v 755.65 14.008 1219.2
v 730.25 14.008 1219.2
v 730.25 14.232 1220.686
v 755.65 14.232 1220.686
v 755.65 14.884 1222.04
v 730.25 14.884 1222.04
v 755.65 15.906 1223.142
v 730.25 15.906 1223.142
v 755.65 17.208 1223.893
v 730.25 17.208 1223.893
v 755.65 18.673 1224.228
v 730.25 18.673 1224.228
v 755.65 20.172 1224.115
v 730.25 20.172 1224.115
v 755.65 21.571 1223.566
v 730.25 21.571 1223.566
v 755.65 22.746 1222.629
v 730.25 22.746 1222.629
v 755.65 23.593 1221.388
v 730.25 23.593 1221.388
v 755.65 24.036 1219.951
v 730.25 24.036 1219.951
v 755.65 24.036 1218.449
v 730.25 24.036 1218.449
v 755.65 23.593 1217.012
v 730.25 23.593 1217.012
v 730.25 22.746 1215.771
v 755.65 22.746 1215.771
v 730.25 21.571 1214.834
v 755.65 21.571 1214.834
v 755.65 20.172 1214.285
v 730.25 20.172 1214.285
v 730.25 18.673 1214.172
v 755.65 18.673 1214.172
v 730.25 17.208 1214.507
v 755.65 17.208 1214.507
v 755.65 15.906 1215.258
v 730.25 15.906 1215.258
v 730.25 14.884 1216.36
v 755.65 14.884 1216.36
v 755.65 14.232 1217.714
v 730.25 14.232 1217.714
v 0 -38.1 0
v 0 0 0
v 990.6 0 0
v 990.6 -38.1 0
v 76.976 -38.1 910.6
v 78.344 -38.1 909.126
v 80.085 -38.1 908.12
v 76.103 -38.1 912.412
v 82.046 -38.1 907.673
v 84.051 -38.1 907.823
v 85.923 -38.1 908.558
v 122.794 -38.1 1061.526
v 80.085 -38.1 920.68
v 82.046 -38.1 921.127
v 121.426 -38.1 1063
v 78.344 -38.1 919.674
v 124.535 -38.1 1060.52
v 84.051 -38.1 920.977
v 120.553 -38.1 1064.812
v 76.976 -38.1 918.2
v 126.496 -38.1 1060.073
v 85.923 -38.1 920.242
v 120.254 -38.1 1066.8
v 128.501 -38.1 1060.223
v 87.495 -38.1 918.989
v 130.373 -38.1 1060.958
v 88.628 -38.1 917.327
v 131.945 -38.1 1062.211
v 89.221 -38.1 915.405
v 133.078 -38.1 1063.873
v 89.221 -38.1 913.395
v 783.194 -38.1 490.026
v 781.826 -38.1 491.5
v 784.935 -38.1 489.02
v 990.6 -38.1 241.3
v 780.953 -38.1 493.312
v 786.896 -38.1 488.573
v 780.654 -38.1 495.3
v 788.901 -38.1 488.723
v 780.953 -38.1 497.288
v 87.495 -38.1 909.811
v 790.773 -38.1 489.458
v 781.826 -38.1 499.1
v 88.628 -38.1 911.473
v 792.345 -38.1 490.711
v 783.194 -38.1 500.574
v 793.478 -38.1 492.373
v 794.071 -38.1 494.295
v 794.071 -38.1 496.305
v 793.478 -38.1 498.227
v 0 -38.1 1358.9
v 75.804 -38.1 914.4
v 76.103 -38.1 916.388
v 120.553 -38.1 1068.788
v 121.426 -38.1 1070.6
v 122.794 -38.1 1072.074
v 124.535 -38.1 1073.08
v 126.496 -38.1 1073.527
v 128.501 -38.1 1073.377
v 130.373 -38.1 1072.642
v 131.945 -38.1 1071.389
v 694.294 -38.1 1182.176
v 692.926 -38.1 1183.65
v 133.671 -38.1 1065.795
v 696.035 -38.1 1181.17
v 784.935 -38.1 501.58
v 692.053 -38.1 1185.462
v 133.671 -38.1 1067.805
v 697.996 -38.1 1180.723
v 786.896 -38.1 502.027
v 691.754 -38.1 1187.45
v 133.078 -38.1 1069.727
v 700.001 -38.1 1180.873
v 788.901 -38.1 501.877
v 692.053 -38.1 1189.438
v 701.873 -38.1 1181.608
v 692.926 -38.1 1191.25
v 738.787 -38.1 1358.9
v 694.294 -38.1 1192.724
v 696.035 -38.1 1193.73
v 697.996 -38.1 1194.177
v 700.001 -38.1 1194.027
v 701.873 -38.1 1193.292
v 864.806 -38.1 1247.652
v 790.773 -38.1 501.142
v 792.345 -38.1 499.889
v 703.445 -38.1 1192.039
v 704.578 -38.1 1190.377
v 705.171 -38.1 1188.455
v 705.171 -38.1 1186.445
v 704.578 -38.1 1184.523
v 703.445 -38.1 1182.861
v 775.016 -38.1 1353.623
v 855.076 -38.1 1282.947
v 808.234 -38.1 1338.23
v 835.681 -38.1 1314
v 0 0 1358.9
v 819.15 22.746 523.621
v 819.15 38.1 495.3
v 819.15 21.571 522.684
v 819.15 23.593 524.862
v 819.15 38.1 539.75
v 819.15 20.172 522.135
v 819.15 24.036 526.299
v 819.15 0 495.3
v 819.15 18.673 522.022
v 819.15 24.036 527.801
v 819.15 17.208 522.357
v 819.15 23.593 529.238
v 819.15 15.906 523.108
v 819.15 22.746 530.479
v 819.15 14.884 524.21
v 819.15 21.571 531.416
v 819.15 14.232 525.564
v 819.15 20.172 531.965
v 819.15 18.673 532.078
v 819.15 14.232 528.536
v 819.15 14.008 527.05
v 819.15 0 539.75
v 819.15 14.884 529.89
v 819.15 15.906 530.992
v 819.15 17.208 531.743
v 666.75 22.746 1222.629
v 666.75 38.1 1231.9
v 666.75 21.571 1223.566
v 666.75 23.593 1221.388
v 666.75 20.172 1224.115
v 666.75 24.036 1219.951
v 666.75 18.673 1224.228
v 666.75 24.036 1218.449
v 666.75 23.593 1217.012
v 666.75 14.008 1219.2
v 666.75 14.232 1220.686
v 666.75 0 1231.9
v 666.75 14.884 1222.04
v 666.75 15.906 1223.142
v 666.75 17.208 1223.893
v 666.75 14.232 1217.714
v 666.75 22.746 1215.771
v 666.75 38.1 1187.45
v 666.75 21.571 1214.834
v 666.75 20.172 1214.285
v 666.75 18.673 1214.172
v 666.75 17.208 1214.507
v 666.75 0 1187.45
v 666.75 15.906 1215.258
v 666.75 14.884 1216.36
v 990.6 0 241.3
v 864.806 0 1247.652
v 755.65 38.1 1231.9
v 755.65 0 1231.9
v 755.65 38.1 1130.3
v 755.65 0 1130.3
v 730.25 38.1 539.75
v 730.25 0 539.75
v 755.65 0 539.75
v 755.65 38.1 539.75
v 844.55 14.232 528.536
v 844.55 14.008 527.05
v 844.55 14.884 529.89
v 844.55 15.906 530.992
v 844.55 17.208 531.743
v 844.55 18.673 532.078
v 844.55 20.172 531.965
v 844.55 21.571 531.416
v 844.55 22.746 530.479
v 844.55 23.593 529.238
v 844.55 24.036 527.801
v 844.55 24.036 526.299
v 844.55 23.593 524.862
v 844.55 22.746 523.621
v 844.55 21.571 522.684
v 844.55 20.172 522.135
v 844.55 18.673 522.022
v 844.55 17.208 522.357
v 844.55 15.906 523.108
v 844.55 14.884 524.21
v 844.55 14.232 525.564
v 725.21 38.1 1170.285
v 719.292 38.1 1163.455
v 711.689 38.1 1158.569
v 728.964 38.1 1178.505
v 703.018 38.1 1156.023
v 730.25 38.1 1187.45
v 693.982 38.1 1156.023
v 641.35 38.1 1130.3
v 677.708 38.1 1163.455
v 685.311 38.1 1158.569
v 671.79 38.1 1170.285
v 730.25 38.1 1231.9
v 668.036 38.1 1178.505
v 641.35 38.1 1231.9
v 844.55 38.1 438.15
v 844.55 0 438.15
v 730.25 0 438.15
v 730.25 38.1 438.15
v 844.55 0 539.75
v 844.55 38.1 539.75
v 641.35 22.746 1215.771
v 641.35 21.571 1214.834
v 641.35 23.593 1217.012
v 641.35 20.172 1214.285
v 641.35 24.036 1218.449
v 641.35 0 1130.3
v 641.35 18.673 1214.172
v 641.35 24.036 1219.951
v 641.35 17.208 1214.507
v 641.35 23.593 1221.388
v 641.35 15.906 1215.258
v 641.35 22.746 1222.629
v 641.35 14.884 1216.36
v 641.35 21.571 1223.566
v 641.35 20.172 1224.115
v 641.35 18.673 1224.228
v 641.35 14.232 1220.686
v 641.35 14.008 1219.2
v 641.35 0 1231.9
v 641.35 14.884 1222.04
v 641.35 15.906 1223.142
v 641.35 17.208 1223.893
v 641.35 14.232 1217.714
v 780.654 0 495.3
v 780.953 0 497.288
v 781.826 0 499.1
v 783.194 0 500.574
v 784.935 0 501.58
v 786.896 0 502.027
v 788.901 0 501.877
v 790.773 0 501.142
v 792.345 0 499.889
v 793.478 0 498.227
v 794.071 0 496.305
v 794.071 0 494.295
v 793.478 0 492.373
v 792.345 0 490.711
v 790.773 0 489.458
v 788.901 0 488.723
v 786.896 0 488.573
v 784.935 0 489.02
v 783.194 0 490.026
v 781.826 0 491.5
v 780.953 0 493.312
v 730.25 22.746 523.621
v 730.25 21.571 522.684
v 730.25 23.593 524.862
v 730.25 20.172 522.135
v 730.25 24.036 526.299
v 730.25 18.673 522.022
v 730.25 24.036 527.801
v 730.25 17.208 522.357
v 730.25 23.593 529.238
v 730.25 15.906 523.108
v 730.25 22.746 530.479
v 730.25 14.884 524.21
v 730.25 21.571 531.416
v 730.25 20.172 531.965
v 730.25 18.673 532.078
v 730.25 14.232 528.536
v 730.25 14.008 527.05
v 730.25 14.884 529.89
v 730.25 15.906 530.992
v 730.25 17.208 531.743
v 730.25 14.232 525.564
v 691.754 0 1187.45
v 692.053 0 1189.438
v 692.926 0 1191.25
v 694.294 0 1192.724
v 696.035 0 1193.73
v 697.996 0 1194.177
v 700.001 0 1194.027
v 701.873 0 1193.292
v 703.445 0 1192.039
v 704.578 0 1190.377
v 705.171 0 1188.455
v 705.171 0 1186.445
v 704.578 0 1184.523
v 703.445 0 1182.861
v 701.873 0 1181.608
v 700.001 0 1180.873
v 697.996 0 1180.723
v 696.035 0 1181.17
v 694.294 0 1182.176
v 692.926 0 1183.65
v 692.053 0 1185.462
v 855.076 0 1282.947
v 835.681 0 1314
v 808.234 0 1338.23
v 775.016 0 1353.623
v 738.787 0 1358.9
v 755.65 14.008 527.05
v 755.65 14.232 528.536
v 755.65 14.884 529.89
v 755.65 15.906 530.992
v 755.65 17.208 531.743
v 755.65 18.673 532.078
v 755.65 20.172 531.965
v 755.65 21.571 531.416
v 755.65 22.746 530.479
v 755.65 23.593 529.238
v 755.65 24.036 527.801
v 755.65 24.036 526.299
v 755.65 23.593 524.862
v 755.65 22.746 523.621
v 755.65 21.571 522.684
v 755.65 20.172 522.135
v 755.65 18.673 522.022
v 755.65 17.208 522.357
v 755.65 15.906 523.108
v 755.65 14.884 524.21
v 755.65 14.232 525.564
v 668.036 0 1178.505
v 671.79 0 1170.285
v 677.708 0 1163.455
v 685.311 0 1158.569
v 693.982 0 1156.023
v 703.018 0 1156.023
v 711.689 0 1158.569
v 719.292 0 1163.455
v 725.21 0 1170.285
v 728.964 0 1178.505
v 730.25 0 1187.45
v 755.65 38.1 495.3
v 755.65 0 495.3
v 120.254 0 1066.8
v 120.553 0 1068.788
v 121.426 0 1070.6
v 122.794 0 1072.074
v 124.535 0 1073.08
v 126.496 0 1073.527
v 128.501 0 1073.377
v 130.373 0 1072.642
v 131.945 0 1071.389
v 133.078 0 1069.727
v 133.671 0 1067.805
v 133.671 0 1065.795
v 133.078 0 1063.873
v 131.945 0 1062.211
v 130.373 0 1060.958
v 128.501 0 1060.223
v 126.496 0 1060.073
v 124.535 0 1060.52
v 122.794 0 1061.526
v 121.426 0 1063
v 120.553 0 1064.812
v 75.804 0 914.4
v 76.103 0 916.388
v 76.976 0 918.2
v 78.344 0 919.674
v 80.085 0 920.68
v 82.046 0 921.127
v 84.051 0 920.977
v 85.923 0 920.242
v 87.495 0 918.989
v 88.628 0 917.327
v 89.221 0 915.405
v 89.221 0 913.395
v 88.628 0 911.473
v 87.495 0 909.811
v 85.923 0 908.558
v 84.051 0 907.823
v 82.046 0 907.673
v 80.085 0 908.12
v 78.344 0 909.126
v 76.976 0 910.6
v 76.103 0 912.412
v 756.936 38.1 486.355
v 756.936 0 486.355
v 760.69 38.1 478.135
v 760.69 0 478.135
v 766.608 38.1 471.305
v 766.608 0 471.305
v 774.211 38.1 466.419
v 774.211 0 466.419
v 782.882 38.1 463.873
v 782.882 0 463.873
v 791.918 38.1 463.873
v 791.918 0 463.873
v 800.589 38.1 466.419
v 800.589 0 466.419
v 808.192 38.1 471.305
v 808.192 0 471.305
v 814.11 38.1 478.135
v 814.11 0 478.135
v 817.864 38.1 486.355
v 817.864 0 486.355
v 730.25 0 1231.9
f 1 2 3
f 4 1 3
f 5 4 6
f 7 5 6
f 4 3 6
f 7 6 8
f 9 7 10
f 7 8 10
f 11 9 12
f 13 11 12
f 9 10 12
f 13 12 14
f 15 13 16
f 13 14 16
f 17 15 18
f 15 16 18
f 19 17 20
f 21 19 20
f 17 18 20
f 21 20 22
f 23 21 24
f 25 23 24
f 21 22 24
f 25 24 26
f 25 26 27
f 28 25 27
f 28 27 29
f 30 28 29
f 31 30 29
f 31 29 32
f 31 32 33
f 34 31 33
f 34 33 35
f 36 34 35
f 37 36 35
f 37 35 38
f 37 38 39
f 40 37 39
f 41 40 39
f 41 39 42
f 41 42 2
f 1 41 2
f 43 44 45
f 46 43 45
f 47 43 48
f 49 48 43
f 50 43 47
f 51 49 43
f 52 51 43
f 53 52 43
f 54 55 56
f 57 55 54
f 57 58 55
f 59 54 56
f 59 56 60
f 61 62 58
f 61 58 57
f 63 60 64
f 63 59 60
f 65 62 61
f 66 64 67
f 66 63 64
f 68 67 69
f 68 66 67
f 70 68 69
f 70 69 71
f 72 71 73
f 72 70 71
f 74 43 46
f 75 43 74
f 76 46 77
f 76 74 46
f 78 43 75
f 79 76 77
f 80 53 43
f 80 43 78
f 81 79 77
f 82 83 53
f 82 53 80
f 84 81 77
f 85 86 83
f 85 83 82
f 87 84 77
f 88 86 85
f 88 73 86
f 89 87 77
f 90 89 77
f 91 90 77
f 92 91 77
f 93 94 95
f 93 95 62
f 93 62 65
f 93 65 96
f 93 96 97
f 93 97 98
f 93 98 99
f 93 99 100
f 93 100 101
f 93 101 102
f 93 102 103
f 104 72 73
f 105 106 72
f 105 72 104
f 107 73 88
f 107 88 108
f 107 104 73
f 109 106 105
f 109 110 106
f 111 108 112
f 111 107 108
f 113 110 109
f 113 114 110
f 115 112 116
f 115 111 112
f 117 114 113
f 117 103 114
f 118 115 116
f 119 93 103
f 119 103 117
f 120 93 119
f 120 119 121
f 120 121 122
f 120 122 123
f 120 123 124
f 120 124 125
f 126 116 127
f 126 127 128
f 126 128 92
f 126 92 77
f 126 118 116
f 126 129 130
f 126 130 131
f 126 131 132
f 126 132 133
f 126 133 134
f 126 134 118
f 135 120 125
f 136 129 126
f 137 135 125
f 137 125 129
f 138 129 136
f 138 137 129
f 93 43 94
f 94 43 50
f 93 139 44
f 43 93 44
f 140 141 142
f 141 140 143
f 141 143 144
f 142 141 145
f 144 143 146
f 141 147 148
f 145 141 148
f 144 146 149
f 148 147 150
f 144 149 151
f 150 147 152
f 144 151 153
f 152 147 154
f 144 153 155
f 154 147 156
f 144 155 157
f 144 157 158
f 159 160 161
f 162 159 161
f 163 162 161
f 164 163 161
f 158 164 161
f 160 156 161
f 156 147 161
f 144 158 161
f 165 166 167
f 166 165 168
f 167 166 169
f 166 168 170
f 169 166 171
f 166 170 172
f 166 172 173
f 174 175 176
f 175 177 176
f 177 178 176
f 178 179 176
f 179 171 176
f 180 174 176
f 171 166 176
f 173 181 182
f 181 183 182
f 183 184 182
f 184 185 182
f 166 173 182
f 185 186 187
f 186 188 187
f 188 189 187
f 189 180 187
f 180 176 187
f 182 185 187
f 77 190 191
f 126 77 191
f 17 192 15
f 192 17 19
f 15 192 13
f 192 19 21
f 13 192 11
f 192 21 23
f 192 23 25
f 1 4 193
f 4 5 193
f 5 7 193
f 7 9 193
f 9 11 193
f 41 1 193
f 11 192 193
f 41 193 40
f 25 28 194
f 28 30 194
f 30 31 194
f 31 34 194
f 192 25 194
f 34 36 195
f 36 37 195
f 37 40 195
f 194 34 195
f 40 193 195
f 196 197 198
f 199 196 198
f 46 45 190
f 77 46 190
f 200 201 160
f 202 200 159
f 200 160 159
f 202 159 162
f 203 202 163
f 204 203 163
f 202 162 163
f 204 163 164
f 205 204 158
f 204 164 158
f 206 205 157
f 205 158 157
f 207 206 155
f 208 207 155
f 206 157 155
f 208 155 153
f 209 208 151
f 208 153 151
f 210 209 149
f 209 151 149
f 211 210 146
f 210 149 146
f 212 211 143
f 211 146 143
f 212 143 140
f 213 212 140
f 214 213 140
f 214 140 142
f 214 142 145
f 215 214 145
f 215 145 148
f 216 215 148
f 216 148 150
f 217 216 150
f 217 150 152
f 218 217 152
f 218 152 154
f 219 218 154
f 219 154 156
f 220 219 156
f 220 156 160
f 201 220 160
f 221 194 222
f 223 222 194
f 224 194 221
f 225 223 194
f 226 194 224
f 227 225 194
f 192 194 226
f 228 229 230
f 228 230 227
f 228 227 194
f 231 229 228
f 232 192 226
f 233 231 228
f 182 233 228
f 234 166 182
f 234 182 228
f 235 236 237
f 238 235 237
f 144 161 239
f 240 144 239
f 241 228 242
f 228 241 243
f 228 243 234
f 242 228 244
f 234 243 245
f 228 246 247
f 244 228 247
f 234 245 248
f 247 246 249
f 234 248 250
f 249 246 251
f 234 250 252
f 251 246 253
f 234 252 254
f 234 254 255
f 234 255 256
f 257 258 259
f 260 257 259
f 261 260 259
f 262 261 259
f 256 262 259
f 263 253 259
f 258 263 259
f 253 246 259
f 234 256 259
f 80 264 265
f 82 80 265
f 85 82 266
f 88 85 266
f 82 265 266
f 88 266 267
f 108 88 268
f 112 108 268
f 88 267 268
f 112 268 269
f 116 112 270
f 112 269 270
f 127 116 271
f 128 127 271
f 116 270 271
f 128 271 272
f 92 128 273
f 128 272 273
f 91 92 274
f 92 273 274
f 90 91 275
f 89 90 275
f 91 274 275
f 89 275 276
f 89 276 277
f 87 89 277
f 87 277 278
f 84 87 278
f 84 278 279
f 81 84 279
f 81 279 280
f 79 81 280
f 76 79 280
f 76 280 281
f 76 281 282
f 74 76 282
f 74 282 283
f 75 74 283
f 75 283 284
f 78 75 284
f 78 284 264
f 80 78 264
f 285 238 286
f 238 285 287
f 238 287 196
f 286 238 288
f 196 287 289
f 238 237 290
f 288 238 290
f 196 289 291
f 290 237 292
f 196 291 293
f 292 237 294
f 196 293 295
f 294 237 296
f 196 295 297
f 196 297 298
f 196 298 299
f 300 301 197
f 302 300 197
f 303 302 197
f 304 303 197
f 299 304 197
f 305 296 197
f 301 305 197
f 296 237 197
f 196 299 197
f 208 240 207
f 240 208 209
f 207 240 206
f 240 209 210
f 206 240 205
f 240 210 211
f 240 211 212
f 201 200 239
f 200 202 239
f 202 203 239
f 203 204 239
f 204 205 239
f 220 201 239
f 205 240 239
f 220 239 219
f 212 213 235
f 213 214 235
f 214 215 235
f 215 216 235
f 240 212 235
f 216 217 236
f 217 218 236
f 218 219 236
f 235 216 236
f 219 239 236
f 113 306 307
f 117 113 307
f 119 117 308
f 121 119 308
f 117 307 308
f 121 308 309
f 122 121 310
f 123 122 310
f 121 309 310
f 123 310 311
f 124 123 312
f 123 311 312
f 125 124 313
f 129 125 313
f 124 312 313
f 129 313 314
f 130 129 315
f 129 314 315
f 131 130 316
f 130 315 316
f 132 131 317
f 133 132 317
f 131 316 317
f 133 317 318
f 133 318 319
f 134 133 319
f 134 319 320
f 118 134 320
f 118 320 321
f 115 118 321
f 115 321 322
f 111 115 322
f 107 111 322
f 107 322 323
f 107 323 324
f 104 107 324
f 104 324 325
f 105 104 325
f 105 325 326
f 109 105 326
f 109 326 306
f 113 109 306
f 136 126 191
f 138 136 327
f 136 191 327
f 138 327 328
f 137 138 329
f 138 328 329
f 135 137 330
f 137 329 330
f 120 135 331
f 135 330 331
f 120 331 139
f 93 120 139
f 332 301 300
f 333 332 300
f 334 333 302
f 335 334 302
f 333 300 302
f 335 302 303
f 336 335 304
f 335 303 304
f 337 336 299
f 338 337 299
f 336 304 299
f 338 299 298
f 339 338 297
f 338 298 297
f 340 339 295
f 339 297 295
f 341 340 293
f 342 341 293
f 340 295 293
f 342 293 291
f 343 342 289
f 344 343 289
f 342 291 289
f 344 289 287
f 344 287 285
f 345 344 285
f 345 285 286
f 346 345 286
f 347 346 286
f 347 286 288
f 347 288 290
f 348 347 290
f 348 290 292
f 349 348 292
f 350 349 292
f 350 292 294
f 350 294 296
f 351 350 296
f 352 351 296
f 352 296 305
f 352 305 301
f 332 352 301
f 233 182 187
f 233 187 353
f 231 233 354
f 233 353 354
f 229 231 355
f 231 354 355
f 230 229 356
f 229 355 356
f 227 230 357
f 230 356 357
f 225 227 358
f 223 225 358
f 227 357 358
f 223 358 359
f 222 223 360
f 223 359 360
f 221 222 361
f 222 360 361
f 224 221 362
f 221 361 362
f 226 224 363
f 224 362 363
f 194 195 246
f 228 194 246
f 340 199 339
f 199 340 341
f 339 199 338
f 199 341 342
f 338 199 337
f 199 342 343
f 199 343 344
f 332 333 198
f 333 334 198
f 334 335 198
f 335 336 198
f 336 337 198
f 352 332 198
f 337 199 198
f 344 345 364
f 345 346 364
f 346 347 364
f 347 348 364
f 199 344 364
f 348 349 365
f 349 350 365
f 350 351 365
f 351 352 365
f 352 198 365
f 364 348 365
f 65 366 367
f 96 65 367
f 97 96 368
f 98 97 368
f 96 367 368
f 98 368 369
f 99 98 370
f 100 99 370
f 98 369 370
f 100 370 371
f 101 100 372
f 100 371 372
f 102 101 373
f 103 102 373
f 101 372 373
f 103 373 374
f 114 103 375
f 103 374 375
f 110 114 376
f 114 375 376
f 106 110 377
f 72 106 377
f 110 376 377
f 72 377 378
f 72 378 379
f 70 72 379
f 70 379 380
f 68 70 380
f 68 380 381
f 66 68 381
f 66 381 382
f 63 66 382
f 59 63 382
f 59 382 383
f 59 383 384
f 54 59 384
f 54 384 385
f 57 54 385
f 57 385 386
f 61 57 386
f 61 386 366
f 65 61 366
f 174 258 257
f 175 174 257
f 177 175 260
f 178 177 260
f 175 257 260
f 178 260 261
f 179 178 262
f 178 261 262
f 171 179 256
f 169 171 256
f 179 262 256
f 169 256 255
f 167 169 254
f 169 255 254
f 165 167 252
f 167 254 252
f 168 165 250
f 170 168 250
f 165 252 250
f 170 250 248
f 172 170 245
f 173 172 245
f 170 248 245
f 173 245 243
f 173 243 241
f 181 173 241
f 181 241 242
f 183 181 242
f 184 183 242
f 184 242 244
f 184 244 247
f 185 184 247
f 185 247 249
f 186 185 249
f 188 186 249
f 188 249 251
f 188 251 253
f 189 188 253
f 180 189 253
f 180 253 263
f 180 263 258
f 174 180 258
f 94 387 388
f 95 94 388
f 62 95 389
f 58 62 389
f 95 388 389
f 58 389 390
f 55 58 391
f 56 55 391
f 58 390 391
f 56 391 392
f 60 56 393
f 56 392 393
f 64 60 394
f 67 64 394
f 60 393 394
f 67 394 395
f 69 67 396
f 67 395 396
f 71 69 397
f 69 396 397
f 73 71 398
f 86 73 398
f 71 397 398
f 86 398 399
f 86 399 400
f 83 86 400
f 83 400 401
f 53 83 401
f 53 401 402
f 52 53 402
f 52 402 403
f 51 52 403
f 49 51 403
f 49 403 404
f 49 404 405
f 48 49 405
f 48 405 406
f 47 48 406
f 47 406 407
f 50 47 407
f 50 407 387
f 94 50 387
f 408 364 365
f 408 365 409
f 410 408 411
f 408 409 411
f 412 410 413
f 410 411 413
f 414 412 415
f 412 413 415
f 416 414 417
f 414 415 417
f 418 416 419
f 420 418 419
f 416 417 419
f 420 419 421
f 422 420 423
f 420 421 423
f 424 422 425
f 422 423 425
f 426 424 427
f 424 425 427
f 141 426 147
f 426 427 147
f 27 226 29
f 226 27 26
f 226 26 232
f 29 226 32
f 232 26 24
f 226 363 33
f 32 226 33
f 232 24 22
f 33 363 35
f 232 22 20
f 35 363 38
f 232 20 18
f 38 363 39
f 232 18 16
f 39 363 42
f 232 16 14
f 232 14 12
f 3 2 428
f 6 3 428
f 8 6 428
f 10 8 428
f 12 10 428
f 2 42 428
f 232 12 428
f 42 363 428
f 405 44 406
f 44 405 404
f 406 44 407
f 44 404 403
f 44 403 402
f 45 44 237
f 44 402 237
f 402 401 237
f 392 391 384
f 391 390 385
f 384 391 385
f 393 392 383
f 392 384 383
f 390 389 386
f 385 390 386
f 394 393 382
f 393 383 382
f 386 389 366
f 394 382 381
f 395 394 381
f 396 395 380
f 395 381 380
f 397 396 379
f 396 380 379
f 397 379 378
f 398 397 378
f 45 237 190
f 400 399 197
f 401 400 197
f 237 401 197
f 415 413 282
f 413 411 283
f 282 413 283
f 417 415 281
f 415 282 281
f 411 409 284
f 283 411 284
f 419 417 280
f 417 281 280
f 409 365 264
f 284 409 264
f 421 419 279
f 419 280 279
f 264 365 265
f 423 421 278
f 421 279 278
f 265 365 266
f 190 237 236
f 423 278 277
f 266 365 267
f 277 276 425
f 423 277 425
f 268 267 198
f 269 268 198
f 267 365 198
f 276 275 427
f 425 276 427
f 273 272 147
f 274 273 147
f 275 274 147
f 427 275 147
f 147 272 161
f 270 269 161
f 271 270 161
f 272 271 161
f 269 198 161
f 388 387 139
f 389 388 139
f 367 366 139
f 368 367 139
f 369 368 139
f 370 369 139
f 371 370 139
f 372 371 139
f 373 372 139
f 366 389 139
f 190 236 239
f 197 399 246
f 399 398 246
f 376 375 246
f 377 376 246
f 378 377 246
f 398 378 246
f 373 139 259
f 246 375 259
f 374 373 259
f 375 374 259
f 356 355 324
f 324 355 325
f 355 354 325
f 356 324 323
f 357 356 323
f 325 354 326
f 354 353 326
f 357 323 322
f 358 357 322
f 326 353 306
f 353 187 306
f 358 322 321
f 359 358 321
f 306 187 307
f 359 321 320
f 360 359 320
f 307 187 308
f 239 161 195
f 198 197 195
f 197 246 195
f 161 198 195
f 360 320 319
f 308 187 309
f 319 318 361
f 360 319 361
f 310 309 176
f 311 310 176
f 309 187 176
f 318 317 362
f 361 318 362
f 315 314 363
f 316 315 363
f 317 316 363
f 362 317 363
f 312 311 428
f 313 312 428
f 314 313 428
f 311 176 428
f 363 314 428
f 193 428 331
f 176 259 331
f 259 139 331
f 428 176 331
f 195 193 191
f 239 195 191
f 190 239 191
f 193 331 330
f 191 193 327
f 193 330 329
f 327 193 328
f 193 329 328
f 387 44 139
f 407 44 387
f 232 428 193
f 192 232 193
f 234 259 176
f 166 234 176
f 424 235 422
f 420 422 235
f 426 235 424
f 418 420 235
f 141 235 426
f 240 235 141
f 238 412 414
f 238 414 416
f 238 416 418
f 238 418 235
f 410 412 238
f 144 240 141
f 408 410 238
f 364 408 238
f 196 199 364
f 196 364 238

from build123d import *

# Parameters (mm, degrees)
F1_DEPTH    = 38.1
F3_D        = 13.49248
F5_DEPTH    = 38.1
F7_DEPTH    = 38.1
F10_D       = 10.0838
F10_ON_F9_D = 10.0838


with BuildPart() as f1:
    # F0 (on Front) → F1 (new body)
    with BuildSketch(Plane.XZ):
        with BuildLine():
            Line((0, 1358.9), (0, 0))
            Line((0, 0), (990.6, 0))
            Line((990.6, 0), (990.6, 241.3))
            Line((990.6, 241.3), (864.8059485884, 1247.6524112928))
            ThreePointArc((864.8059485884, 1247.6524112928), (822.8355837767, 1327.1091283286), (738.7866582458, 1358.9))
            Line((738.7866582458, 1358.9), (0, 1358.9))
        make_face()
    extrude(amount=F1_DEPTH)

    # F3 (through all)
    with Locations(Plane.XZ.offset(38.1)):
        with Locations((698.5, 1187.45), (82.55, 914.4), (127, 1066.8), (787.4, 495.3)):
            Hole(F3_D / 2)

    # F4 (on face) → F5 (join)
    with BuildSketch(Plane(origin=(0, 0, 0), x_dir=(-1, 0, 0), z_dir=(0, 1, 0))):
        with BuildLine():
            ThreePointArc((-666.75, 1187.45), (-698.5, 1155.7), (-730.25, 1187.45))
            Line((-730.25, 1187.45), (-730.25, 1231.9))
            Line((-730.25, 1231.9), (-755.65, 1231.9))
            Line((-755.65, 1231.9), (-755.65, 1130.3))
            Line((-755.65, 1130.3), (-698.5, 1130.3))
            Line((-698.5, 1130.3), (-641.35, 1130.3))
            Line((-641.35, 1130.3), (-641.35, 1231.9))
            Line((-641.35, 1231.9), (-666.75, 1231.9))
            Line((-666.75, 1231.9), (-666.75, 1187.45))
        make_face()
    extrude(amount=F5_DEPTH)

    # F6 (on face) → F7 (join)
    with BuildSketch(Plane(origin=(0, 0, 0), x_dir=(-1, 0, 0), z_dir=(0, 1, 0))):
        with BuildLine():
            ThreePointArc((-755.65, 495.3), (-787.4, 463.55), (-819.15, 495.3))
            Line((-819.15, 495.3), (-819.15, 539.75))
            Line((-819.15, 539.75), (-844.55, 539.75))
            Line((-844.55, 539.75), (-844.55, 438.15))
            Line((-844.55, 438.15), (-787.4, 438.15))
            Line((-787.4, 438.15), (-730.25, 438.15))
            Line((-730.25, 438.15), (-730.25, 539.75))
            Line((-730.25, 539.75), (-755.65, 539.75))
            Line((-755.65, 539.75), (-755.65, 495.3))
        make_face()
    extrude(amount=F7_DEPTH)

    # F10 (through all)
    with Locations(Plane.YZ.offset(755.65)):
        with Locations((19.05, 1219.2)):
            Hole(F10_D / 2)

    # F10 on F9 (through all)
    with Locations(Plane.YZ.offset(844.55)):
        with Locations((19.05, 527.05)):
            Hole(F10_ON_F9_D / 2)


solid = f1.part
